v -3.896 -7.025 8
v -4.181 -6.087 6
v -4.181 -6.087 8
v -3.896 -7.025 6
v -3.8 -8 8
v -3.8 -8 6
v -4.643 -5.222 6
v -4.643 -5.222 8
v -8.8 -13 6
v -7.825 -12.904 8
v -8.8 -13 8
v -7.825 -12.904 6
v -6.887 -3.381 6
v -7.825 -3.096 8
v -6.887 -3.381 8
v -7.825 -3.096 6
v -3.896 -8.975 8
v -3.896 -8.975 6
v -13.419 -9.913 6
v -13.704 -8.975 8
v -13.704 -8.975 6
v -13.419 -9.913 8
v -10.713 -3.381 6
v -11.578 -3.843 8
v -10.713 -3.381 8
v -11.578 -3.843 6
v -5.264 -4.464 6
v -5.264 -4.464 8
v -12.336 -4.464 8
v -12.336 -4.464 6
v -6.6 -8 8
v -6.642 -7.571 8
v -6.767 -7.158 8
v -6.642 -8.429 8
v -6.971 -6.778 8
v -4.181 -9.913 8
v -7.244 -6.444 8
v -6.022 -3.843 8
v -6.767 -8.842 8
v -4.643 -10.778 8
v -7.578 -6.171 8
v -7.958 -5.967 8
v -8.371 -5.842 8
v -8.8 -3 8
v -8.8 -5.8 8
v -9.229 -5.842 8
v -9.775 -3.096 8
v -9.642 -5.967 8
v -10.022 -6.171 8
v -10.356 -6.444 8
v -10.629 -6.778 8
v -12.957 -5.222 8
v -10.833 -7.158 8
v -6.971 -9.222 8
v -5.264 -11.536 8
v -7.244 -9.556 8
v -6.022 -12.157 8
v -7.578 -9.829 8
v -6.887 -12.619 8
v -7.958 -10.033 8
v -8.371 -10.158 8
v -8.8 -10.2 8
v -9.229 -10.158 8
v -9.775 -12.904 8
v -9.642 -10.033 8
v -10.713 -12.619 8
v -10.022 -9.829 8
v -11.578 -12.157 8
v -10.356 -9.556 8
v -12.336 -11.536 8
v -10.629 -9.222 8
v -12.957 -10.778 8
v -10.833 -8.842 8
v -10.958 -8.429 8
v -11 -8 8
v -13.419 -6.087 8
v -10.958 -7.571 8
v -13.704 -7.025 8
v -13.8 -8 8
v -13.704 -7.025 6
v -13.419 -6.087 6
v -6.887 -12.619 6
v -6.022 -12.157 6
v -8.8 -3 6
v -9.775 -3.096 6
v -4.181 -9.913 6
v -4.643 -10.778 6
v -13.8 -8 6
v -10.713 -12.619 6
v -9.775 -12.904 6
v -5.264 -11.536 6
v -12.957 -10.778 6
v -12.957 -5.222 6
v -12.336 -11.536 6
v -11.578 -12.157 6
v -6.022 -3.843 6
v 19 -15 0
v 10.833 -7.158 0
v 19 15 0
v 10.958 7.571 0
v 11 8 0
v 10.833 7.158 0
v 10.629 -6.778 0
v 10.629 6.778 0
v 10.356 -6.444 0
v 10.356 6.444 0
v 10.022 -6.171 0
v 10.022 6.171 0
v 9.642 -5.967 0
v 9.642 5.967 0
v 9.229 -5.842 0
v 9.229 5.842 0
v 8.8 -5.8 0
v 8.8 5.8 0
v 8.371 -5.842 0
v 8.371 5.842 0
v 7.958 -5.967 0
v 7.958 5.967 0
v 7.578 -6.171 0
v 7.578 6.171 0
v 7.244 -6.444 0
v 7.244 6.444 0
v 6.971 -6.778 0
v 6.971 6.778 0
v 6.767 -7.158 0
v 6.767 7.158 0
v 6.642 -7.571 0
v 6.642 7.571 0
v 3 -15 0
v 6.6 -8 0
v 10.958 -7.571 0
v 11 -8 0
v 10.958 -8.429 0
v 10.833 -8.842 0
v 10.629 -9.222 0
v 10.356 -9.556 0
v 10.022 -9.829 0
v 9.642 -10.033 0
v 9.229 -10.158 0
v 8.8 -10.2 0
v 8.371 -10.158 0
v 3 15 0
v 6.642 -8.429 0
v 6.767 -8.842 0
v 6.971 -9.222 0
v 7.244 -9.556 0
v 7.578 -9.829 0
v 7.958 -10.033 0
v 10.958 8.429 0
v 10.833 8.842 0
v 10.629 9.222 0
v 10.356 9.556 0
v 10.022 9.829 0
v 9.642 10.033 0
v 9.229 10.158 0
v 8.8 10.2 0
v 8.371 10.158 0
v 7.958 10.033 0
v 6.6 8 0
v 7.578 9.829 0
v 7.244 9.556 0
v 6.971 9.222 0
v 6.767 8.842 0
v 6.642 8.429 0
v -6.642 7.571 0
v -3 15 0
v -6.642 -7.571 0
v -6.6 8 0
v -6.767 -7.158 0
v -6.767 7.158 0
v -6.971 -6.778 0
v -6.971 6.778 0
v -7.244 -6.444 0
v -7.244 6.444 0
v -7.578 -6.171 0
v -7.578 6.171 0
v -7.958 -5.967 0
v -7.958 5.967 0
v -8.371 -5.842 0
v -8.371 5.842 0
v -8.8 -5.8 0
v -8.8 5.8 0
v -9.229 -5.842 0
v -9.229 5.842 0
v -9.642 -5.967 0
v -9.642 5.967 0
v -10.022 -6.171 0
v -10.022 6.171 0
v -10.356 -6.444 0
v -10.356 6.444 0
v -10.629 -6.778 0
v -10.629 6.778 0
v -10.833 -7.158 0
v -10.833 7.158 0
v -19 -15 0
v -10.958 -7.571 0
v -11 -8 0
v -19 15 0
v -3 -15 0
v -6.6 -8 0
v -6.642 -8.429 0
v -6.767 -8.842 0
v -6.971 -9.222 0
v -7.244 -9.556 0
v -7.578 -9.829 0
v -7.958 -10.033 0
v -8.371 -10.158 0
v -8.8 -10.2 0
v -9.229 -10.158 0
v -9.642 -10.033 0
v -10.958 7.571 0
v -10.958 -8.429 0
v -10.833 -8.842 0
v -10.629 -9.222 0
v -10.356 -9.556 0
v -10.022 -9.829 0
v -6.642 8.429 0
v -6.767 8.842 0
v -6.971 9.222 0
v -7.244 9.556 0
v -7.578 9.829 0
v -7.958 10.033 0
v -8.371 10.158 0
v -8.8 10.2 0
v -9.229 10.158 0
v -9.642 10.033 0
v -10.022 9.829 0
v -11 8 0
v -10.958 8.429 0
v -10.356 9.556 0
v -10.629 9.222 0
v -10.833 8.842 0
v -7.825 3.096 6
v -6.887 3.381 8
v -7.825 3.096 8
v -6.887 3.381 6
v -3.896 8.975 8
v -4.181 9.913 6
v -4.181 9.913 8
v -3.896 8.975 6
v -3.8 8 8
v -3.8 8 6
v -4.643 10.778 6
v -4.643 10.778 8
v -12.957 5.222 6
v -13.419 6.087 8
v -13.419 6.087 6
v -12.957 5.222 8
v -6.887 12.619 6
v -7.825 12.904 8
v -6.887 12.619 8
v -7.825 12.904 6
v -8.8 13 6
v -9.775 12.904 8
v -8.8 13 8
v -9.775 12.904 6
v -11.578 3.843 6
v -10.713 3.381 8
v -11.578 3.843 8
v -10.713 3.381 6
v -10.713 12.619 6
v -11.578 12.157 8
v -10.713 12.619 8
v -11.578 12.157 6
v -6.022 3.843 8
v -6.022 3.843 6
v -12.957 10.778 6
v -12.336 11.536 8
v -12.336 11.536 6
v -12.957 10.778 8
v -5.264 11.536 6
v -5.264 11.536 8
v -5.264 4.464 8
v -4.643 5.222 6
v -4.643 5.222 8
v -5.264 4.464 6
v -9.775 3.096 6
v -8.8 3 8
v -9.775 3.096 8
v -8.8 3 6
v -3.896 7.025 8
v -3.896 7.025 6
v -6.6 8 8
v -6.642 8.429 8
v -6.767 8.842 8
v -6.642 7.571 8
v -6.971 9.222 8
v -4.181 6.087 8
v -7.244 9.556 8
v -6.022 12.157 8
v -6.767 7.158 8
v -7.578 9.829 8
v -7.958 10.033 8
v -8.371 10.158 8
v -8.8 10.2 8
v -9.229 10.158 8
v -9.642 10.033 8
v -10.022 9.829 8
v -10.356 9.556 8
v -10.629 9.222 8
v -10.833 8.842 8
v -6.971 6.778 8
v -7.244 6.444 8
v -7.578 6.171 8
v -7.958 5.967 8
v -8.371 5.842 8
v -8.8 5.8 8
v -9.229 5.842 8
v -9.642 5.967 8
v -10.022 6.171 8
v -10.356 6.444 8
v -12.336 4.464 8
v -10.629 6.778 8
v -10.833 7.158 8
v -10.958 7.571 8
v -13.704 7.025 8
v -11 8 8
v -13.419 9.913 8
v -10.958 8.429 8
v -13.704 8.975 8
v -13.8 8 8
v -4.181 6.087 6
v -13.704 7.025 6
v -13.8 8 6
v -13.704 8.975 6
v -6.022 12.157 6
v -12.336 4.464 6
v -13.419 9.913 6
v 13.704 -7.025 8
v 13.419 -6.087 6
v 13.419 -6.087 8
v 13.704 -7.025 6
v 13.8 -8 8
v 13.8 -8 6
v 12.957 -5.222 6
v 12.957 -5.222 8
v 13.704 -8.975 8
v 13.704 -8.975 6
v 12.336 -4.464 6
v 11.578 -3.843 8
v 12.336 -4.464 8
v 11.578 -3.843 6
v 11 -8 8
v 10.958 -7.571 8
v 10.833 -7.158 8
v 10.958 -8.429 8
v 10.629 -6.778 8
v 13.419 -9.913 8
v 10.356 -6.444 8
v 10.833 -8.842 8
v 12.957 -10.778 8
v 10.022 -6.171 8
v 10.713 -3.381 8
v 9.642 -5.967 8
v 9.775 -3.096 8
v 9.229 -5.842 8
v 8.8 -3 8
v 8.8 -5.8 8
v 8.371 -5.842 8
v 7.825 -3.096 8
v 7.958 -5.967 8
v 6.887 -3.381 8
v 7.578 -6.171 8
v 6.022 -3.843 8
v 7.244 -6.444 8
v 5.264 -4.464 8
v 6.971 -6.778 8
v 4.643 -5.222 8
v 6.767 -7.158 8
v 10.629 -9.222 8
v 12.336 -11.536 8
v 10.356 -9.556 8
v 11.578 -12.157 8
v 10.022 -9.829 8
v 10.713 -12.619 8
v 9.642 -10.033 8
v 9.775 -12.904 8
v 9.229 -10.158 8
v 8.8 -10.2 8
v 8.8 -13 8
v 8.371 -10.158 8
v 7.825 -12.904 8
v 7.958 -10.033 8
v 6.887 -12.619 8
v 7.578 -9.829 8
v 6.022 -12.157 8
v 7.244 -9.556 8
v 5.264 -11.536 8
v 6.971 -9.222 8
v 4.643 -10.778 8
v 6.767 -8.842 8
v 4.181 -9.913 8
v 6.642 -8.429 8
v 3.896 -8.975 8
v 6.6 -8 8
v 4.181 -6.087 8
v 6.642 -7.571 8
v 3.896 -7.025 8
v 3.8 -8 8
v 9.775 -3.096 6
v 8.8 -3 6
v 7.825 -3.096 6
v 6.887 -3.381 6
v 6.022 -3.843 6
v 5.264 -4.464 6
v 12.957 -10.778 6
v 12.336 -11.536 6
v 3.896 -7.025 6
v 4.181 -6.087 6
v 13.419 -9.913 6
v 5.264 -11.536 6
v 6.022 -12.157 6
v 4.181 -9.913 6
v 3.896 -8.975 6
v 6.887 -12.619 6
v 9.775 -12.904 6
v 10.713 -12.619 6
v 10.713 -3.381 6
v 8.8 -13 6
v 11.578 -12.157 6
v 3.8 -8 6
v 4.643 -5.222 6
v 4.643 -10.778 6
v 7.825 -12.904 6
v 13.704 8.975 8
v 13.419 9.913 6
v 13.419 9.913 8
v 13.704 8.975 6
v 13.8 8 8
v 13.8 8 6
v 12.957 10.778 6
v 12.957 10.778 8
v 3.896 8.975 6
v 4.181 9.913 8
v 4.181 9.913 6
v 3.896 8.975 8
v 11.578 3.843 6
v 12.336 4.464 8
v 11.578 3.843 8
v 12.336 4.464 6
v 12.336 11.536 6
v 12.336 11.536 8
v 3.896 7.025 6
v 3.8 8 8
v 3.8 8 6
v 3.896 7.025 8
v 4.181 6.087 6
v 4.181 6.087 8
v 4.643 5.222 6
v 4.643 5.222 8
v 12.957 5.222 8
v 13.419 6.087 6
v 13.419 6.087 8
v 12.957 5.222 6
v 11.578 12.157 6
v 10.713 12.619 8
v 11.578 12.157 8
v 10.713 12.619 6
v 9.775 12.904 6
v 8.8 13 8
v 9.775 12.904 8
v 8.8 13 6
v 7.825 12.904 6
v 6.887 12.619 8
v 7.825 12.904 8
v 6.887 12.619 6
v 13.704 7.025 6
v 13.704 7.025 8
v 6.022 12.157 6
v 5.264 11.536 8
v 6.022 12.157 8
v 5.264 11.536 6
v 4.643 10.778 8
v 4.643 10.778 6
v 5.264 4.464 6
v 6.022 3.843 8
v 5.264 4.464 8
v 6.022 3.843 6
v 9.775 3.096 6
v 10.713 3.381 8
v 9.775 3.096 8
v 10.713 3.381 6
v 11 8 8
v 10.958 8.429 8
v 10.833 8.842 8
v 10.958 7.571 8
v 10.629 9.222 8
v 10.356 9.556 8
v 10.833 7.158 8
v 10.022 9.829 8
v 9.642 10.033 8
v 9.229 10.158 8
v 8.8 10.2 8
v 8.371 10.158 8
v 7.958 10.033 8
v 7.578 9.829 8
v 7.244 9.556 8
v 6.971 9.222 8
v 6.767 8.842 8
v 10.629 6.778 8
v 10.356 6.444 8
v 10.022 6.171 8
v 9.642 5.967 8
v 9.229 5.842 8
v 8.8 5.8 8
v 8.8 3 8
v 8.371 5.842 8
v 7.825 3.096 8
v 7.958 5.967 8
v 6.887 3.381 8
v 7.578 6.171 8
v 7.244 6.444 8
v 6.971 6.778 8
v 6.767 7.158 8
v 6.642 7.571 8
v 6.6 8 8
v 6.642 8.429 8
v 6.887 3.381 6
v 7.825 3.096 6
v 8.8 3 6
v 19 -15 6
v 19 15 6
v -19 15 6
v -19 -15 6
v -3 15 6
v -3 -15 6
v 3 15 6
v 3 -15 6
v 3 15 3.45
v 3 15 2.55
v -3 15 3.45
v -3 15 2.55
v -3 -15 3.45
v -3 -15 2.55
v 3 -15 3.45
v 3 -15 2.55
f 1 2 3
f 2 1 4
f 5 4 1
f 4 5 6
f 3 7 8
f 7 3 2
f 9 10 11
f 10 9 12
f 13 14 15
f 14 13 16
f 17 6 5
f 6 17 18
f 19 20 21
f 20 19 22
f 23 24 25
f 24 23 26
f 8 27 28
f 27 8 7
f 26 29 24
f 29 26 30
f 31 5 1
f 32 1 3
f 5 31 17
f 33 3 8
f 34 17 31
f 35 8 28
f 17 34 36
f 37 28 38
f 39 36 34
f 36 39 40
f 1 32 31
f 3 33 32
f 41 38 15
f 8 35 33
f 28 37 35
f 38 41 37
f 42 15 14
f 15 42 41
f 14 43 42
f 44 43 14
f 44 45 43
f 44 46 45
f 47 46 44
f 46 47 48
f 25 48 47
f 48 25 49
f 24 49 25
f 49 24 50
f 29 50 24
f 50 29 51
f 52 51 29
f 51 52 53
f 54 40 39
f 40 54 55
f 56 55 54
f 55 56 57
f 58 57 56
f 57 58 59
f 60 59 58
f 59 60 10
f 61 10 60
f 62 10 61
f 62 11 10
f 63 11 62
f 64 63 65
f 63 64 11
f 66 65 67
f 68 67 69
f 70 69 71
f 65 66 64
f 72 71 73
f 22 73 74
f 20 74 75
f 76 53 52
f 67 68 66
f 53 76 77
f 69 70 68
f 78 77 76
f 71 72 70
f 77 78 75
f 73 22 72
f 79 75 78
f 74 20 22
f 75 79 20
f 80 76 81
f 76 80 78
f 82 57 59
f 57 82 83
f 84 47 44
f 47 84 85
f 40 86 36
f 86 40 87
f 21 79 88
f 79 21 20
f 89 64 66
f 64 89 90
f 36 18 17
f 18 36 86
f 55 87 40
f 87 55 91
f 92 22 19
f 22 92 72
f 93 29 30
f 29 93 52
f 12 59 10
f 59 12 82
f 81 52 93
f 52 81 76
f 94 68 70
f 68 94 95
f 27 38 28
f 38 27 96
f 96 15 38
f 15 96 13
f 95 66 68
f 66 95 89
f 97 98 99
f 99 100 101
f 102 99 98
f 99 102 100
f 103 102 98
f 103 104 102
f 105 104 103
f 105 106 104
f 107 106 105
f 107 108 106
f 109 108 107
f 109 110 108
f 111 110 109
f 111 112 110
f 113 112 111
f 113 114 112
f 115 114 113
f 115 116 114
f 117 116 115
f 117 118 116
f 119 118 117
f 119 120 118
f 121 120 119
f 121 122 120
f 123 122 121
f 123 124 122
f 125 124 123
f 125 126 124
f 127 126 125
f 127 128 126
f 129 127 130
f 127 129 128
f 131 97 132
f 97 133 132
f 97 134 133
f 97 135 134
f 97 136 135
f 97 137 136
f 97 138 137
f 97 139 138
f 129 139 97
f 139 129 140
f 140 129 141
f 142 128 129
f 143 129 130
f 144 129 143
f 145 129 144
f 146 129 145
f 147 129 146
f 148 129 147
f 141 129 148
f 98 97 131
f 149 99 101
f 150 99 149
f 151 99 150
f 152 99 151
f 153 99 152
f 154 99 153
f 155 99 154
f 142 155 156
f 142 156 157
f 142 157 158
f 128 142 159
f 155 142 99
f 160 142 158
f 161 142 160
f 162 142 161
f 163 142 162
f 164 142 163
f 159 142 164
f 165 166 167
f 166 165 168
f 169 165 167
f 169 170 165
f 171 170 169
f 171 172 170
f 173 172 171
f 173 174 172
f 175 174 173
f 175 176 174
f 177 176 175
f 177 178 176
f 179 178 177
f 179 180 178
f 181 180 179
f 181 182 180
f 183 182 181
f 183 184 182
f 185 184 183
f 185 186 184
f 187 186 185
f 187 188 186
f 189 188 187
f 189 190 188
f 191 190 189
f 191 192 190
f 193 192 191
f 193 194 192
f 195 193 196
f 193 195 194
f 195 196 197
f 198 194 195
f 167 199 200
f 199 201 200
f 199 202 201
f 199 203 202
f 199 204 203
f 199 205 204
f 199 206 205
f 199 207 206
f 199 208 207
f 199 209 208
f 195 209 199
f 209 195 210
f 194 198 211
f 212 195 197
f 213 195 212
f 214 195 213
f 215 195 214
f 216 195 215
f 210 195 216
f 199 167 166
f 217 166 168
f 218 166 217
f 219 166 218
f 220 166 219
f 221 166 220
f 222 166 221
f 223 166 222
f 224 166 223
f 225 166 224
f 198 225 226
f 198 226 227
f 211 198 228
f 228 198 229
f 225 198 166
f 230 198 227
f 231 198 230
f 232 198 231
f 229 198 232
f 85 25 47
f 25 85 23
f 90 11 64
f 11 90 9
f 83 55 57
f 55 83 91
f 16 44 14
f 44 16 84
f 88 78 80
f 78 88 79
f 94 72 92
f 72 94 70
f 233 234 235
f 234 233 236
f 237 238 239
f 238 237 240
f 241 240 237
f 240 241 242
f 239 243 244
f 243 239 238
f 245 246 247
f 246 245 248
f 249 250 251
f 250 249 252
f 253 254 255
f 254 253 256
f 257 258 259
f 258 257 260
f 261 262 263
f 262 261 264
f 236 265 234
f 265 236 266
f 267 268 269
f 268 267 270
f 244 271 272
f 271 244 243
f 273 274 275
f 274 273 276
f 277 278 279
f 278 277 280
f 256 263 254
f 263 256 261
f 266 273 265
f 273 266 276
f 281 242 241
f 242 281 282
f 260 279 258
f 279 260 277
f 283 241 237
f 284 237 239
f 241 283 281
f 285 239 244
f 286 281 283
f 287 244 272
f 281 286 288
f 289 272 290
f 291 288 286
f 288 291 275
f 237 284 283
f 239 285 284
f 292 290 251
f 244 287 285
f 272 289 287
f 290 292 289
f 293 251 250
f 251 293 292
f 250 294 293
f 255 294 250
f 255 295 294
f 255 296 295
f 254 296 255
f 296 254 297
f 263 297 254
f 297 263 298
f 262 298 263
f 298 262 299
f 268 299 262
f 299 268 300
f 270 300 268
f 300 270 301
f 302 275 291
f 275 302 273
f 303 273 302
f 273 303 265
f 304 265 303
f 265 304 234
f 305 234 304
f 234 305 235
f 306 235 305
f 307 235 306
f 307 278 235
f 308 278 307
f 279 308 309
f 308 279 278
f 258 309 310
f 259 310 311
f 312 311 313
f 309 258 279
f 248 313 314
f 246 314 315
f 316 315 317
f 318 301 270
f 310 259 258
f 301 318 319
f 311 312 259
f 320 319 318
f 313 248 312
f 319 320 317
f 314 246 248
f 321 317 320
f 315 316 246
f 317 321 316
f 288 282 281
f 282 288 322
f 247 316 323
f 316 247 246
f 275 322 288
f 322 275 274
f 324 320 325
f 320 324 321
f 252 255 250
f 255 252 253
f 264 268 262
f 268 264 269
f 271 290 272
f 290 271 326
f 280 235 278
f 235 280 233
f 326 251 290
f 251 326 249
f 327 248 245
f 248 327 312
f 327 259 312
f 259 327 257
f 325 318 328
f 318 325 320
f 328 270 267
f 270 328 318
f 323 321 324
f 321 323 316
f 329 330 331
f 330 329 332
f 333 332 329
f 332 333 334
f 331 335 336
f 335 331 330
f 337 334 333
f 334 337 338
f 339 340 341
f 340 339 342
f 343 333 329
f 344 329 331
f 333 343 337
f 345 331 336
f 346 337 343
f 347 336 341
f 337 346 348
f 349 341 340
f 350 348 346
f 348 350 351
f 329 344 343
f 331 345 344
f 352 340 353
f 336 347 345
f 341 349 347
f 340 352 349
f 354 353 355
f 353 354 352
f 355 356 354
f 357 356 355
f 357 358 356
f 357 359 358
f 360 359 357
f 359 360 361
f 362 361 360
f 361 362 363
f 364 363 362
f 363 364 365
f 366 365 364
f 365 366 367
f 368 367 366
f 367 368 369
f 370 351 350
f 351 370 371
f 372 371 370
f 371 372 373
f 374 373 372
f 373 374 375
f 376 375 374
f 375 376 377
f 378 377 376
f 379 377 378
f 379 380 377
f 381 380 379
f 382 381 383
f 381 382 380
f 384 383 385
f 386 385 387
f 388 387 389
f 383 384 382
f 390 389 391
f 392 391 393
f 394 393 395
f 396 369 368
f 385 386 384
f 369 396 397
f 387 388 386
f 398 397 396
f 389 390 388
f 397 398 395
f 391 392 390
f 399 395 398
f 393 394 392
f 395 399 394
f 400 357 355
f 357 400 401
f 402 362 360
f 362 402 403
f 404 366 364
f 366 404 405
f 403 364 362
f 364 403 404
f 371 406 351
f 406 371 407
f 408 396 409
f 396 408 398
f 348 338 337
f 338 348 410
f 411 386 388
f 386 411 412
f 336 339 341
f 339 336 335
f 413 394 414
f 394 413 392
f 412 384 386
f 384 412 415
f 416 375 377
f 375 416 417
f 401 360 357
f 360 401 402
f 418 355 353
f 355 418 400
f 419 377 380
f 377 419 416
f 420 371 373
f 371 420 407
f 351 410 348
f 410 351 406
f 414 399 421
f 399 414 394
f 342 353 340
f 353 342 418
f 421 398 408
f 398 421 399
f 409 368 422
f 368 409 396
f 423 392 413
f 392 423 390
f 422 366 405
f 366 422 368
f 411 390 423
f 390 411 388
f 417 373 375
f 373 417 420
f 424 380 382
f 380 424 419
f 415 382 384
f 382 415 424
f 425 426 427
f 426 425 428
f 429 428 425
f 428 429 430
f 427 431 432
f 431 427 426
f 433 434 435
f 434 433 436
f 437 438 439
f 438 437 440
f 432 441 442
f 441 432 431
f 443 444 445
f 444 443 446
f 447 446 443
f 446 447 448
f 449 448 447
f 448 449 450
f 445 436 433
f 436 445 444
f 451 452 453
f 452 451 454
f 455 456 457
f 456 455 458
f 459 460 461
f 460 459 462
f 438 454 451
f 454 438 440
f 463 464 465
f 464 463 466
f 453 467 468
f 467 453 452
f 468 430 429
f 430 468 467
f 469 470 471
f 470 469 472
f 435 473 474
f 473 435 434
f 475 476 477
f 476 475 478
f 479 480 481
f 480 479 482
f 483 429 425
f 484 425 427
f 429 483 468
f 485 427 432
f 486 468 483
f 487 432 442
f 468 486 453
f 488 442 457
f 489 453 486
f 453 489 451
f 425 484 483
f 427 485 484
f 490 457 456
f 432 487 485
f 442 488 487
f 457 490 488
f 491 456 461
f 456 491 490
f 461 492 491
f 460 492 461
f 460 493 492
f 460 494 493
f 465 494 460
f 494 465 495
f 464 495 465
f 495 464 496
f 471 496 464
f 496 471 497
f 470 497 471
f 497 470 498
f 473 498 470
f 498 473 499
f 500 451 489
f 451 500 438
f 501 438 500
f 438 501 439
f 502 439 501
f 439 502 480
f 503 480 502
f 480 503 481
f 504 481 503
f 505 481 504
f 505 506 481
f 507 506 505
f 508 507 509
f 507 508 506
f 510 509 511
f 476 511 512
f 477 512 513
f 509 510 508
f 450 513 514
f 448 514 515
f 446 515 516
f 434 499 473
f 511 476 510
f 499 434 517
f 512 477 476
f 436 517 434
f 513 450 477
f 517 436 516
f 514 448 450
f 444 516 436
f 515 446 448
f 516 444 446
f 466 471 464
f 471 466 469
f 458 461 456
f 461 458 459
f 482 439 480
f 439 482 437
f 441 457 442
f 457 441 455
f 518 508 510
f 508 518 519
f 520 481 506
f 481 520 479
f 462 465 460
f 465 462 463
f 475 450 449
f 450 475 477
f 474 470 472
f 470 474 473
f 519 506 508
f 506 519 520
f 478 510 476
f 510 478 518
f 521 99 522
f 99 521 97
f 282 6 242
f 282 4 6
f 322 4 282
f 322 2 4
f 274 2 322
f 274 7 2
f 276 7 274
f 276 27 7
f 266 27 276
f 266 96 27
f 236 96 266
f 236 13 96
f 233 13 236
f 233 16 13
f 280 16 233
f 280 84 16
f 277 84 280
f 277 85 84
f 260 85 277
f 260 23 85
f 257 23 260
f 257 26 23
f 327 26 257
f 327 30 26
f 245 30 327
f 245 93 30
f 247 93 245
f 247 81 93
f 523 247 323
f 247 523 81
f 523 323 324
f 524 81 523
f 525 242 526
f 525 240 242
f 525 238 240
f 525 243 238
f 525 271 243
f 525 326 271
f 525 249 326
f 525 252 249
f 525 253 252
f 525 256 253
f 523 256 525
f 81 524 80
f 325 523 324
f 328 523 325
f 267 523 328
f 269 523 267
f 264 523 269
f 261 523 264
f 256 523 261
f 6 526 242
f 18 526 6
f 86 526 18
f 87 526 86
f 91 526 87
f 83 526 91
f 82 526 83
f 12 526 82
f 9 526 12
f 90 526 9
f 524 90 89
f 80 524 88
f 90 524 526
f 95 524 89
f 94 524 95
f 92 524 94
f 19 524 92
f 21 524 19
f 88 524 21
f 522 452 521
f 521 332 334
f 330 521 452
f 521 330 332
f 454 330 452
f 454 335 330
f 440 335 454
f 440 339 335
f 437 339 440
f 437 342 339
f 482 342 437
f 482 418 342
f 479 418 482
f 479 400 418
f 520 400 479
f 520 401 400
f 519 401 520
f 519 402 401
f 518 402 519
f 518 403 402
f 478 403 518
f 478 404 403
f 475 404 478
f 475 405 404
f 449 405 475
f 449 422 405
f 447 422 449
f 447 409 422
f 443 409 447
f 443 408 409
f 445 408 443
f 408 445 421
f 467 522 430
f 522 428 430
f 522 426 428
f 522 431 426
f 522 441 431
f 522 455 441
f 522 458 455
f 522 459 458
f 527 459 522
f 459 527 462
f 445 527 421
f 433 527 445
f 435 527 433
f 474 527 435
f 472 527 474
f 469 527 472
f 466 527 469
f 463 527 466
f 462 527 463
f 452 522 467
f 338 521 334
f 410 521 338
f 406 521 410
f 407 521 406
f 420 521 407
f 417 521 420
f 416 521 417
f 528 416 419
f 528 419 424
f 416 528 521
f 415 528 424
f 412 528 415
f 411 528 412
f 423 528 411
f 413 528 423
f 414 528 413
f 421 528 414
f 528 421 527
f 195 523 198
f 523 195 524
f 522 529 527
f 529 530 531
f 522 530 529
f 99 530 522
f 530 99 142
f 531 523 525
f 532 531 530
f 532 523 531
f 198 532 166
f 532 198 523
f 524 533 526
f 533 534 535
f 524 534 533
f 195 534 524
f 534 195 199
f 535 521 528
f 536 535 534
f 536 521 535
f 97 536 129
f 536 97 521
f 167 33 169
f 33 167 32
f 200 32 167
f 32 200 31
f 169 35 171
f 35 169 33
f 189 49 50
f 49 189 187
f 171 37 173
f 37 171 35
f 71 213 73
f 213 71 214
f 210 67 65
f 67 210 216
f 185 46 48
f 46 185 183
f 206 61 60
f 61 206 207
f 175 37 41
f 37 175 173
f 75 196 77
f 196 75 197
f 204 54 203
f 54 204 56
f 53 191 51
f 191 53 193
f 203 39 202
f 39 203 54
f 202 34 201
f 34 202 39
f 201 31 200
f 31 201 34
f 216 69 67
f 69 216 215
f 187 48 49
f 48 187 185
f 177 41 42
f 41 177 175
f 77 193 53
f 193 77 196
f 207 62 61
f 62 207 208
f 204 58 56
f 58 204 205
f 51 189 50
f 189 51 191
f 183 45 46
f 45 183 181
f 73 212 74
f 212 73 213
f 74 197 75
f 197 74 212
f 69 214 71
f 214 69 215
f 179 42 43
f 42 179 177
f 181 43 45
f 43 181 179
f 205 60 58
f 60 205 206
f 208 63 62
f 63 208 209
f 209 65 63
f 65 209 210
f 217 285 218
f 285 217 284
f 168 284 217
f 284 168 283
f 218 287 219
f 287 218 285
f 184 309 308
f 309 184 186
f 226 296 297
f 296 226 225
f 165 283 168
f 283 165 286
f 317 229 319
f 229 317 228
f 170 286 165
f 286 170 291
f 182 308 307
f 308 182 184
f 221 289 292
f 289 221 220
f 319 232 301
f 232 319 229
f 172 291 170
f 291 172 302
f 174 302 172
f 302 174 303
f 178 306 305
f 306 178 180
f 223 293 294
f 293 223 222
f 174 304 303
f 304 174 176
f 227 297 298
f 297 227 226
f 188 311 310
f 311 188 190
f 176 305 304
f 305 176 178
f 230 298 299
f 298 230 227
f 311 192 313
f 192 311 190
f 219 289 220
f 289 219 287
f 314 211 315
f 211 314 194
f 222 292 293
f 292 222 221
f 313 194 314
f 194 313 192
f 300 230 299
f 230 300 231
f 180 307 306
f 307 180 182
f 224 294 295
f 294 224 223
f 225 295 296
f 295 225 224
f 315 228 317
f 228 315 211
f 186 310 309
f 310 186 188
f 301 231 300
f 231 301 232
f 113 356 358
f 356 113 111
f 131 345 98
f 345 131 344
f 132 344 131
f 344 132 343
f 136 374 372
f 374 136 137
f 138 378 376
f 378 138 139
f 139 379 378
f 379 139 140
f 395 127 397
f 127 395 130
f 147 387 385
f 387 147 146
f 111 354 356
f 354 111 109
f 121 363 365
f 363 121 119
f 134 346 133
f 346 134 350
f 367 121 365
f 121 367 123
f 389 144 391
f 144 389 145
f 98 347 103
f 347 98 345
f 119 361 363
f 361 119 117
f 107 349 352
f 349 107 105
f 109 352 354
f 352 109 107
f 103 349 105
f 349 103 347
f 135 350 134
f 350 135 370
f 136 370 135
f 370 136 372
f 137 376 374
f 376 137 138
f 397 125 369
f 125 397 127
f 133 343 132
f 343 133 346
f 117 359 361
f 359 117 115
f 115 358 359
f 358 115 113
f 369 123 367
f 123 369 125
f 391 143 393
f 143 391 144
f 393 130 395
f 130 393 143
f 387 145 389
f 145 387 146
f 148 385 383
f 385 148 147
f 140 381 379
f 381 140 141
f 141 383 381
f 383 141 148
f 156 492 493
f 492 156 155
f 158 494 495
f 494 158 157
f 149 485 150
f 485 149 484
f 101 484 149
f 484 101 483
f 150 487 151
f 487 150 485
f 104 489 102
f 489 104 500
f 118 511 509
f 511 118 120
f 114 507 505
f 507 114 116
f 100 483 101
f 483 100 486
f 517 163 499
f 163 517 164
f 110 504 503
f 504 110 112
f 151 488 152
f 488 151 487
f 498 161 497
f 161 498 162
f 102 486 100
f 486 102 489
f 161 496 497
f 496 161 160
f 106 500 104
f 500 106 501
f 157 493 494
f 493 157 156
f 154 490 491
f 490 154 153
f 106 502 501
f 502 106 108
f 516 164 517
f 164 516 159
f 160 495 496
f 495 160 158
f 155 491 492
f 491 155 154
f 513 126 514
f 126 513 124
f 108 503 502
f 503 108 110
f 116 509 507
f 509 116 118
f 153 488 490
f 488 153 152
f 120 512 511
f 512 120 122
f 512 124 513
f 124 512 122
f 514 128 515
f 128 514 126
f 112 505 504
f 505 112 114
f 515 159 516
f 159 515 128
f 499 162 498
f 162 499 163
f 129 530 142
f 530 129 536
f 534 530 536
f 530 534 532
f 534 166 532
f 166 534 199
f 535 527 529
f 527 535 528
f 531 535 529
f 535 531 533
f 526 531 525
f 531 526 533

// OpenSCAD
$fn = 32;

// ----------------------------------------------------------------------
// Living hinge: 38 x 30 mm plates, 0.9 mm flexible web
// ----------------------------------------------------------------------

// --- parameters (mm) ---
plate_len = 16;           // plate length outside the web
plate_w = 30;             // plate width
thick = 6;                // plate thickness
web_half = 3;             // half width of the flex band
web_t = 0.9;              // flexible web thickness
web_z = 2.55;             // web position inside the thickness
boss_d = 10;              // screw boss diameter
boss_h = 8;               // screw boss height
boss_x = 8.8;             // screw boss distance from the web
screw_d = 4.4;            // screw hole

difference() {
  union() {
    /* one flat strip, later thinned at the middle */
    translate([-19, -15, 0]) cube([38, 30, 6]);
    /* screw bosses, sunk 0.5 mm into the plates */
    for (sx = [-8.8, 8.8]) {
      for (sy = [-8, 8]) {
        translate([sx, sy, 0]) cylinder(h = boss_h, d = boss_d);
      }
    }
  }
  /* channel from below: leaves the web on top of it */
  translate([-3, -17.5, -2.5]) cube([6, 35, 5.05]);
  /* channel from above: thins the web down to web_t */
  translate([-3, -17.5, 3.45]) cube([6, 35, 5.05]);
  /* screw holes through the bosses */
  for (sx = [-8.8, 8.8]) {
    for (sy = [-8, 8]) {
      translate([sx, sy, -2.5]) cylinder(h = boss_h + 5, d = screw_d);
    }
  }
}
